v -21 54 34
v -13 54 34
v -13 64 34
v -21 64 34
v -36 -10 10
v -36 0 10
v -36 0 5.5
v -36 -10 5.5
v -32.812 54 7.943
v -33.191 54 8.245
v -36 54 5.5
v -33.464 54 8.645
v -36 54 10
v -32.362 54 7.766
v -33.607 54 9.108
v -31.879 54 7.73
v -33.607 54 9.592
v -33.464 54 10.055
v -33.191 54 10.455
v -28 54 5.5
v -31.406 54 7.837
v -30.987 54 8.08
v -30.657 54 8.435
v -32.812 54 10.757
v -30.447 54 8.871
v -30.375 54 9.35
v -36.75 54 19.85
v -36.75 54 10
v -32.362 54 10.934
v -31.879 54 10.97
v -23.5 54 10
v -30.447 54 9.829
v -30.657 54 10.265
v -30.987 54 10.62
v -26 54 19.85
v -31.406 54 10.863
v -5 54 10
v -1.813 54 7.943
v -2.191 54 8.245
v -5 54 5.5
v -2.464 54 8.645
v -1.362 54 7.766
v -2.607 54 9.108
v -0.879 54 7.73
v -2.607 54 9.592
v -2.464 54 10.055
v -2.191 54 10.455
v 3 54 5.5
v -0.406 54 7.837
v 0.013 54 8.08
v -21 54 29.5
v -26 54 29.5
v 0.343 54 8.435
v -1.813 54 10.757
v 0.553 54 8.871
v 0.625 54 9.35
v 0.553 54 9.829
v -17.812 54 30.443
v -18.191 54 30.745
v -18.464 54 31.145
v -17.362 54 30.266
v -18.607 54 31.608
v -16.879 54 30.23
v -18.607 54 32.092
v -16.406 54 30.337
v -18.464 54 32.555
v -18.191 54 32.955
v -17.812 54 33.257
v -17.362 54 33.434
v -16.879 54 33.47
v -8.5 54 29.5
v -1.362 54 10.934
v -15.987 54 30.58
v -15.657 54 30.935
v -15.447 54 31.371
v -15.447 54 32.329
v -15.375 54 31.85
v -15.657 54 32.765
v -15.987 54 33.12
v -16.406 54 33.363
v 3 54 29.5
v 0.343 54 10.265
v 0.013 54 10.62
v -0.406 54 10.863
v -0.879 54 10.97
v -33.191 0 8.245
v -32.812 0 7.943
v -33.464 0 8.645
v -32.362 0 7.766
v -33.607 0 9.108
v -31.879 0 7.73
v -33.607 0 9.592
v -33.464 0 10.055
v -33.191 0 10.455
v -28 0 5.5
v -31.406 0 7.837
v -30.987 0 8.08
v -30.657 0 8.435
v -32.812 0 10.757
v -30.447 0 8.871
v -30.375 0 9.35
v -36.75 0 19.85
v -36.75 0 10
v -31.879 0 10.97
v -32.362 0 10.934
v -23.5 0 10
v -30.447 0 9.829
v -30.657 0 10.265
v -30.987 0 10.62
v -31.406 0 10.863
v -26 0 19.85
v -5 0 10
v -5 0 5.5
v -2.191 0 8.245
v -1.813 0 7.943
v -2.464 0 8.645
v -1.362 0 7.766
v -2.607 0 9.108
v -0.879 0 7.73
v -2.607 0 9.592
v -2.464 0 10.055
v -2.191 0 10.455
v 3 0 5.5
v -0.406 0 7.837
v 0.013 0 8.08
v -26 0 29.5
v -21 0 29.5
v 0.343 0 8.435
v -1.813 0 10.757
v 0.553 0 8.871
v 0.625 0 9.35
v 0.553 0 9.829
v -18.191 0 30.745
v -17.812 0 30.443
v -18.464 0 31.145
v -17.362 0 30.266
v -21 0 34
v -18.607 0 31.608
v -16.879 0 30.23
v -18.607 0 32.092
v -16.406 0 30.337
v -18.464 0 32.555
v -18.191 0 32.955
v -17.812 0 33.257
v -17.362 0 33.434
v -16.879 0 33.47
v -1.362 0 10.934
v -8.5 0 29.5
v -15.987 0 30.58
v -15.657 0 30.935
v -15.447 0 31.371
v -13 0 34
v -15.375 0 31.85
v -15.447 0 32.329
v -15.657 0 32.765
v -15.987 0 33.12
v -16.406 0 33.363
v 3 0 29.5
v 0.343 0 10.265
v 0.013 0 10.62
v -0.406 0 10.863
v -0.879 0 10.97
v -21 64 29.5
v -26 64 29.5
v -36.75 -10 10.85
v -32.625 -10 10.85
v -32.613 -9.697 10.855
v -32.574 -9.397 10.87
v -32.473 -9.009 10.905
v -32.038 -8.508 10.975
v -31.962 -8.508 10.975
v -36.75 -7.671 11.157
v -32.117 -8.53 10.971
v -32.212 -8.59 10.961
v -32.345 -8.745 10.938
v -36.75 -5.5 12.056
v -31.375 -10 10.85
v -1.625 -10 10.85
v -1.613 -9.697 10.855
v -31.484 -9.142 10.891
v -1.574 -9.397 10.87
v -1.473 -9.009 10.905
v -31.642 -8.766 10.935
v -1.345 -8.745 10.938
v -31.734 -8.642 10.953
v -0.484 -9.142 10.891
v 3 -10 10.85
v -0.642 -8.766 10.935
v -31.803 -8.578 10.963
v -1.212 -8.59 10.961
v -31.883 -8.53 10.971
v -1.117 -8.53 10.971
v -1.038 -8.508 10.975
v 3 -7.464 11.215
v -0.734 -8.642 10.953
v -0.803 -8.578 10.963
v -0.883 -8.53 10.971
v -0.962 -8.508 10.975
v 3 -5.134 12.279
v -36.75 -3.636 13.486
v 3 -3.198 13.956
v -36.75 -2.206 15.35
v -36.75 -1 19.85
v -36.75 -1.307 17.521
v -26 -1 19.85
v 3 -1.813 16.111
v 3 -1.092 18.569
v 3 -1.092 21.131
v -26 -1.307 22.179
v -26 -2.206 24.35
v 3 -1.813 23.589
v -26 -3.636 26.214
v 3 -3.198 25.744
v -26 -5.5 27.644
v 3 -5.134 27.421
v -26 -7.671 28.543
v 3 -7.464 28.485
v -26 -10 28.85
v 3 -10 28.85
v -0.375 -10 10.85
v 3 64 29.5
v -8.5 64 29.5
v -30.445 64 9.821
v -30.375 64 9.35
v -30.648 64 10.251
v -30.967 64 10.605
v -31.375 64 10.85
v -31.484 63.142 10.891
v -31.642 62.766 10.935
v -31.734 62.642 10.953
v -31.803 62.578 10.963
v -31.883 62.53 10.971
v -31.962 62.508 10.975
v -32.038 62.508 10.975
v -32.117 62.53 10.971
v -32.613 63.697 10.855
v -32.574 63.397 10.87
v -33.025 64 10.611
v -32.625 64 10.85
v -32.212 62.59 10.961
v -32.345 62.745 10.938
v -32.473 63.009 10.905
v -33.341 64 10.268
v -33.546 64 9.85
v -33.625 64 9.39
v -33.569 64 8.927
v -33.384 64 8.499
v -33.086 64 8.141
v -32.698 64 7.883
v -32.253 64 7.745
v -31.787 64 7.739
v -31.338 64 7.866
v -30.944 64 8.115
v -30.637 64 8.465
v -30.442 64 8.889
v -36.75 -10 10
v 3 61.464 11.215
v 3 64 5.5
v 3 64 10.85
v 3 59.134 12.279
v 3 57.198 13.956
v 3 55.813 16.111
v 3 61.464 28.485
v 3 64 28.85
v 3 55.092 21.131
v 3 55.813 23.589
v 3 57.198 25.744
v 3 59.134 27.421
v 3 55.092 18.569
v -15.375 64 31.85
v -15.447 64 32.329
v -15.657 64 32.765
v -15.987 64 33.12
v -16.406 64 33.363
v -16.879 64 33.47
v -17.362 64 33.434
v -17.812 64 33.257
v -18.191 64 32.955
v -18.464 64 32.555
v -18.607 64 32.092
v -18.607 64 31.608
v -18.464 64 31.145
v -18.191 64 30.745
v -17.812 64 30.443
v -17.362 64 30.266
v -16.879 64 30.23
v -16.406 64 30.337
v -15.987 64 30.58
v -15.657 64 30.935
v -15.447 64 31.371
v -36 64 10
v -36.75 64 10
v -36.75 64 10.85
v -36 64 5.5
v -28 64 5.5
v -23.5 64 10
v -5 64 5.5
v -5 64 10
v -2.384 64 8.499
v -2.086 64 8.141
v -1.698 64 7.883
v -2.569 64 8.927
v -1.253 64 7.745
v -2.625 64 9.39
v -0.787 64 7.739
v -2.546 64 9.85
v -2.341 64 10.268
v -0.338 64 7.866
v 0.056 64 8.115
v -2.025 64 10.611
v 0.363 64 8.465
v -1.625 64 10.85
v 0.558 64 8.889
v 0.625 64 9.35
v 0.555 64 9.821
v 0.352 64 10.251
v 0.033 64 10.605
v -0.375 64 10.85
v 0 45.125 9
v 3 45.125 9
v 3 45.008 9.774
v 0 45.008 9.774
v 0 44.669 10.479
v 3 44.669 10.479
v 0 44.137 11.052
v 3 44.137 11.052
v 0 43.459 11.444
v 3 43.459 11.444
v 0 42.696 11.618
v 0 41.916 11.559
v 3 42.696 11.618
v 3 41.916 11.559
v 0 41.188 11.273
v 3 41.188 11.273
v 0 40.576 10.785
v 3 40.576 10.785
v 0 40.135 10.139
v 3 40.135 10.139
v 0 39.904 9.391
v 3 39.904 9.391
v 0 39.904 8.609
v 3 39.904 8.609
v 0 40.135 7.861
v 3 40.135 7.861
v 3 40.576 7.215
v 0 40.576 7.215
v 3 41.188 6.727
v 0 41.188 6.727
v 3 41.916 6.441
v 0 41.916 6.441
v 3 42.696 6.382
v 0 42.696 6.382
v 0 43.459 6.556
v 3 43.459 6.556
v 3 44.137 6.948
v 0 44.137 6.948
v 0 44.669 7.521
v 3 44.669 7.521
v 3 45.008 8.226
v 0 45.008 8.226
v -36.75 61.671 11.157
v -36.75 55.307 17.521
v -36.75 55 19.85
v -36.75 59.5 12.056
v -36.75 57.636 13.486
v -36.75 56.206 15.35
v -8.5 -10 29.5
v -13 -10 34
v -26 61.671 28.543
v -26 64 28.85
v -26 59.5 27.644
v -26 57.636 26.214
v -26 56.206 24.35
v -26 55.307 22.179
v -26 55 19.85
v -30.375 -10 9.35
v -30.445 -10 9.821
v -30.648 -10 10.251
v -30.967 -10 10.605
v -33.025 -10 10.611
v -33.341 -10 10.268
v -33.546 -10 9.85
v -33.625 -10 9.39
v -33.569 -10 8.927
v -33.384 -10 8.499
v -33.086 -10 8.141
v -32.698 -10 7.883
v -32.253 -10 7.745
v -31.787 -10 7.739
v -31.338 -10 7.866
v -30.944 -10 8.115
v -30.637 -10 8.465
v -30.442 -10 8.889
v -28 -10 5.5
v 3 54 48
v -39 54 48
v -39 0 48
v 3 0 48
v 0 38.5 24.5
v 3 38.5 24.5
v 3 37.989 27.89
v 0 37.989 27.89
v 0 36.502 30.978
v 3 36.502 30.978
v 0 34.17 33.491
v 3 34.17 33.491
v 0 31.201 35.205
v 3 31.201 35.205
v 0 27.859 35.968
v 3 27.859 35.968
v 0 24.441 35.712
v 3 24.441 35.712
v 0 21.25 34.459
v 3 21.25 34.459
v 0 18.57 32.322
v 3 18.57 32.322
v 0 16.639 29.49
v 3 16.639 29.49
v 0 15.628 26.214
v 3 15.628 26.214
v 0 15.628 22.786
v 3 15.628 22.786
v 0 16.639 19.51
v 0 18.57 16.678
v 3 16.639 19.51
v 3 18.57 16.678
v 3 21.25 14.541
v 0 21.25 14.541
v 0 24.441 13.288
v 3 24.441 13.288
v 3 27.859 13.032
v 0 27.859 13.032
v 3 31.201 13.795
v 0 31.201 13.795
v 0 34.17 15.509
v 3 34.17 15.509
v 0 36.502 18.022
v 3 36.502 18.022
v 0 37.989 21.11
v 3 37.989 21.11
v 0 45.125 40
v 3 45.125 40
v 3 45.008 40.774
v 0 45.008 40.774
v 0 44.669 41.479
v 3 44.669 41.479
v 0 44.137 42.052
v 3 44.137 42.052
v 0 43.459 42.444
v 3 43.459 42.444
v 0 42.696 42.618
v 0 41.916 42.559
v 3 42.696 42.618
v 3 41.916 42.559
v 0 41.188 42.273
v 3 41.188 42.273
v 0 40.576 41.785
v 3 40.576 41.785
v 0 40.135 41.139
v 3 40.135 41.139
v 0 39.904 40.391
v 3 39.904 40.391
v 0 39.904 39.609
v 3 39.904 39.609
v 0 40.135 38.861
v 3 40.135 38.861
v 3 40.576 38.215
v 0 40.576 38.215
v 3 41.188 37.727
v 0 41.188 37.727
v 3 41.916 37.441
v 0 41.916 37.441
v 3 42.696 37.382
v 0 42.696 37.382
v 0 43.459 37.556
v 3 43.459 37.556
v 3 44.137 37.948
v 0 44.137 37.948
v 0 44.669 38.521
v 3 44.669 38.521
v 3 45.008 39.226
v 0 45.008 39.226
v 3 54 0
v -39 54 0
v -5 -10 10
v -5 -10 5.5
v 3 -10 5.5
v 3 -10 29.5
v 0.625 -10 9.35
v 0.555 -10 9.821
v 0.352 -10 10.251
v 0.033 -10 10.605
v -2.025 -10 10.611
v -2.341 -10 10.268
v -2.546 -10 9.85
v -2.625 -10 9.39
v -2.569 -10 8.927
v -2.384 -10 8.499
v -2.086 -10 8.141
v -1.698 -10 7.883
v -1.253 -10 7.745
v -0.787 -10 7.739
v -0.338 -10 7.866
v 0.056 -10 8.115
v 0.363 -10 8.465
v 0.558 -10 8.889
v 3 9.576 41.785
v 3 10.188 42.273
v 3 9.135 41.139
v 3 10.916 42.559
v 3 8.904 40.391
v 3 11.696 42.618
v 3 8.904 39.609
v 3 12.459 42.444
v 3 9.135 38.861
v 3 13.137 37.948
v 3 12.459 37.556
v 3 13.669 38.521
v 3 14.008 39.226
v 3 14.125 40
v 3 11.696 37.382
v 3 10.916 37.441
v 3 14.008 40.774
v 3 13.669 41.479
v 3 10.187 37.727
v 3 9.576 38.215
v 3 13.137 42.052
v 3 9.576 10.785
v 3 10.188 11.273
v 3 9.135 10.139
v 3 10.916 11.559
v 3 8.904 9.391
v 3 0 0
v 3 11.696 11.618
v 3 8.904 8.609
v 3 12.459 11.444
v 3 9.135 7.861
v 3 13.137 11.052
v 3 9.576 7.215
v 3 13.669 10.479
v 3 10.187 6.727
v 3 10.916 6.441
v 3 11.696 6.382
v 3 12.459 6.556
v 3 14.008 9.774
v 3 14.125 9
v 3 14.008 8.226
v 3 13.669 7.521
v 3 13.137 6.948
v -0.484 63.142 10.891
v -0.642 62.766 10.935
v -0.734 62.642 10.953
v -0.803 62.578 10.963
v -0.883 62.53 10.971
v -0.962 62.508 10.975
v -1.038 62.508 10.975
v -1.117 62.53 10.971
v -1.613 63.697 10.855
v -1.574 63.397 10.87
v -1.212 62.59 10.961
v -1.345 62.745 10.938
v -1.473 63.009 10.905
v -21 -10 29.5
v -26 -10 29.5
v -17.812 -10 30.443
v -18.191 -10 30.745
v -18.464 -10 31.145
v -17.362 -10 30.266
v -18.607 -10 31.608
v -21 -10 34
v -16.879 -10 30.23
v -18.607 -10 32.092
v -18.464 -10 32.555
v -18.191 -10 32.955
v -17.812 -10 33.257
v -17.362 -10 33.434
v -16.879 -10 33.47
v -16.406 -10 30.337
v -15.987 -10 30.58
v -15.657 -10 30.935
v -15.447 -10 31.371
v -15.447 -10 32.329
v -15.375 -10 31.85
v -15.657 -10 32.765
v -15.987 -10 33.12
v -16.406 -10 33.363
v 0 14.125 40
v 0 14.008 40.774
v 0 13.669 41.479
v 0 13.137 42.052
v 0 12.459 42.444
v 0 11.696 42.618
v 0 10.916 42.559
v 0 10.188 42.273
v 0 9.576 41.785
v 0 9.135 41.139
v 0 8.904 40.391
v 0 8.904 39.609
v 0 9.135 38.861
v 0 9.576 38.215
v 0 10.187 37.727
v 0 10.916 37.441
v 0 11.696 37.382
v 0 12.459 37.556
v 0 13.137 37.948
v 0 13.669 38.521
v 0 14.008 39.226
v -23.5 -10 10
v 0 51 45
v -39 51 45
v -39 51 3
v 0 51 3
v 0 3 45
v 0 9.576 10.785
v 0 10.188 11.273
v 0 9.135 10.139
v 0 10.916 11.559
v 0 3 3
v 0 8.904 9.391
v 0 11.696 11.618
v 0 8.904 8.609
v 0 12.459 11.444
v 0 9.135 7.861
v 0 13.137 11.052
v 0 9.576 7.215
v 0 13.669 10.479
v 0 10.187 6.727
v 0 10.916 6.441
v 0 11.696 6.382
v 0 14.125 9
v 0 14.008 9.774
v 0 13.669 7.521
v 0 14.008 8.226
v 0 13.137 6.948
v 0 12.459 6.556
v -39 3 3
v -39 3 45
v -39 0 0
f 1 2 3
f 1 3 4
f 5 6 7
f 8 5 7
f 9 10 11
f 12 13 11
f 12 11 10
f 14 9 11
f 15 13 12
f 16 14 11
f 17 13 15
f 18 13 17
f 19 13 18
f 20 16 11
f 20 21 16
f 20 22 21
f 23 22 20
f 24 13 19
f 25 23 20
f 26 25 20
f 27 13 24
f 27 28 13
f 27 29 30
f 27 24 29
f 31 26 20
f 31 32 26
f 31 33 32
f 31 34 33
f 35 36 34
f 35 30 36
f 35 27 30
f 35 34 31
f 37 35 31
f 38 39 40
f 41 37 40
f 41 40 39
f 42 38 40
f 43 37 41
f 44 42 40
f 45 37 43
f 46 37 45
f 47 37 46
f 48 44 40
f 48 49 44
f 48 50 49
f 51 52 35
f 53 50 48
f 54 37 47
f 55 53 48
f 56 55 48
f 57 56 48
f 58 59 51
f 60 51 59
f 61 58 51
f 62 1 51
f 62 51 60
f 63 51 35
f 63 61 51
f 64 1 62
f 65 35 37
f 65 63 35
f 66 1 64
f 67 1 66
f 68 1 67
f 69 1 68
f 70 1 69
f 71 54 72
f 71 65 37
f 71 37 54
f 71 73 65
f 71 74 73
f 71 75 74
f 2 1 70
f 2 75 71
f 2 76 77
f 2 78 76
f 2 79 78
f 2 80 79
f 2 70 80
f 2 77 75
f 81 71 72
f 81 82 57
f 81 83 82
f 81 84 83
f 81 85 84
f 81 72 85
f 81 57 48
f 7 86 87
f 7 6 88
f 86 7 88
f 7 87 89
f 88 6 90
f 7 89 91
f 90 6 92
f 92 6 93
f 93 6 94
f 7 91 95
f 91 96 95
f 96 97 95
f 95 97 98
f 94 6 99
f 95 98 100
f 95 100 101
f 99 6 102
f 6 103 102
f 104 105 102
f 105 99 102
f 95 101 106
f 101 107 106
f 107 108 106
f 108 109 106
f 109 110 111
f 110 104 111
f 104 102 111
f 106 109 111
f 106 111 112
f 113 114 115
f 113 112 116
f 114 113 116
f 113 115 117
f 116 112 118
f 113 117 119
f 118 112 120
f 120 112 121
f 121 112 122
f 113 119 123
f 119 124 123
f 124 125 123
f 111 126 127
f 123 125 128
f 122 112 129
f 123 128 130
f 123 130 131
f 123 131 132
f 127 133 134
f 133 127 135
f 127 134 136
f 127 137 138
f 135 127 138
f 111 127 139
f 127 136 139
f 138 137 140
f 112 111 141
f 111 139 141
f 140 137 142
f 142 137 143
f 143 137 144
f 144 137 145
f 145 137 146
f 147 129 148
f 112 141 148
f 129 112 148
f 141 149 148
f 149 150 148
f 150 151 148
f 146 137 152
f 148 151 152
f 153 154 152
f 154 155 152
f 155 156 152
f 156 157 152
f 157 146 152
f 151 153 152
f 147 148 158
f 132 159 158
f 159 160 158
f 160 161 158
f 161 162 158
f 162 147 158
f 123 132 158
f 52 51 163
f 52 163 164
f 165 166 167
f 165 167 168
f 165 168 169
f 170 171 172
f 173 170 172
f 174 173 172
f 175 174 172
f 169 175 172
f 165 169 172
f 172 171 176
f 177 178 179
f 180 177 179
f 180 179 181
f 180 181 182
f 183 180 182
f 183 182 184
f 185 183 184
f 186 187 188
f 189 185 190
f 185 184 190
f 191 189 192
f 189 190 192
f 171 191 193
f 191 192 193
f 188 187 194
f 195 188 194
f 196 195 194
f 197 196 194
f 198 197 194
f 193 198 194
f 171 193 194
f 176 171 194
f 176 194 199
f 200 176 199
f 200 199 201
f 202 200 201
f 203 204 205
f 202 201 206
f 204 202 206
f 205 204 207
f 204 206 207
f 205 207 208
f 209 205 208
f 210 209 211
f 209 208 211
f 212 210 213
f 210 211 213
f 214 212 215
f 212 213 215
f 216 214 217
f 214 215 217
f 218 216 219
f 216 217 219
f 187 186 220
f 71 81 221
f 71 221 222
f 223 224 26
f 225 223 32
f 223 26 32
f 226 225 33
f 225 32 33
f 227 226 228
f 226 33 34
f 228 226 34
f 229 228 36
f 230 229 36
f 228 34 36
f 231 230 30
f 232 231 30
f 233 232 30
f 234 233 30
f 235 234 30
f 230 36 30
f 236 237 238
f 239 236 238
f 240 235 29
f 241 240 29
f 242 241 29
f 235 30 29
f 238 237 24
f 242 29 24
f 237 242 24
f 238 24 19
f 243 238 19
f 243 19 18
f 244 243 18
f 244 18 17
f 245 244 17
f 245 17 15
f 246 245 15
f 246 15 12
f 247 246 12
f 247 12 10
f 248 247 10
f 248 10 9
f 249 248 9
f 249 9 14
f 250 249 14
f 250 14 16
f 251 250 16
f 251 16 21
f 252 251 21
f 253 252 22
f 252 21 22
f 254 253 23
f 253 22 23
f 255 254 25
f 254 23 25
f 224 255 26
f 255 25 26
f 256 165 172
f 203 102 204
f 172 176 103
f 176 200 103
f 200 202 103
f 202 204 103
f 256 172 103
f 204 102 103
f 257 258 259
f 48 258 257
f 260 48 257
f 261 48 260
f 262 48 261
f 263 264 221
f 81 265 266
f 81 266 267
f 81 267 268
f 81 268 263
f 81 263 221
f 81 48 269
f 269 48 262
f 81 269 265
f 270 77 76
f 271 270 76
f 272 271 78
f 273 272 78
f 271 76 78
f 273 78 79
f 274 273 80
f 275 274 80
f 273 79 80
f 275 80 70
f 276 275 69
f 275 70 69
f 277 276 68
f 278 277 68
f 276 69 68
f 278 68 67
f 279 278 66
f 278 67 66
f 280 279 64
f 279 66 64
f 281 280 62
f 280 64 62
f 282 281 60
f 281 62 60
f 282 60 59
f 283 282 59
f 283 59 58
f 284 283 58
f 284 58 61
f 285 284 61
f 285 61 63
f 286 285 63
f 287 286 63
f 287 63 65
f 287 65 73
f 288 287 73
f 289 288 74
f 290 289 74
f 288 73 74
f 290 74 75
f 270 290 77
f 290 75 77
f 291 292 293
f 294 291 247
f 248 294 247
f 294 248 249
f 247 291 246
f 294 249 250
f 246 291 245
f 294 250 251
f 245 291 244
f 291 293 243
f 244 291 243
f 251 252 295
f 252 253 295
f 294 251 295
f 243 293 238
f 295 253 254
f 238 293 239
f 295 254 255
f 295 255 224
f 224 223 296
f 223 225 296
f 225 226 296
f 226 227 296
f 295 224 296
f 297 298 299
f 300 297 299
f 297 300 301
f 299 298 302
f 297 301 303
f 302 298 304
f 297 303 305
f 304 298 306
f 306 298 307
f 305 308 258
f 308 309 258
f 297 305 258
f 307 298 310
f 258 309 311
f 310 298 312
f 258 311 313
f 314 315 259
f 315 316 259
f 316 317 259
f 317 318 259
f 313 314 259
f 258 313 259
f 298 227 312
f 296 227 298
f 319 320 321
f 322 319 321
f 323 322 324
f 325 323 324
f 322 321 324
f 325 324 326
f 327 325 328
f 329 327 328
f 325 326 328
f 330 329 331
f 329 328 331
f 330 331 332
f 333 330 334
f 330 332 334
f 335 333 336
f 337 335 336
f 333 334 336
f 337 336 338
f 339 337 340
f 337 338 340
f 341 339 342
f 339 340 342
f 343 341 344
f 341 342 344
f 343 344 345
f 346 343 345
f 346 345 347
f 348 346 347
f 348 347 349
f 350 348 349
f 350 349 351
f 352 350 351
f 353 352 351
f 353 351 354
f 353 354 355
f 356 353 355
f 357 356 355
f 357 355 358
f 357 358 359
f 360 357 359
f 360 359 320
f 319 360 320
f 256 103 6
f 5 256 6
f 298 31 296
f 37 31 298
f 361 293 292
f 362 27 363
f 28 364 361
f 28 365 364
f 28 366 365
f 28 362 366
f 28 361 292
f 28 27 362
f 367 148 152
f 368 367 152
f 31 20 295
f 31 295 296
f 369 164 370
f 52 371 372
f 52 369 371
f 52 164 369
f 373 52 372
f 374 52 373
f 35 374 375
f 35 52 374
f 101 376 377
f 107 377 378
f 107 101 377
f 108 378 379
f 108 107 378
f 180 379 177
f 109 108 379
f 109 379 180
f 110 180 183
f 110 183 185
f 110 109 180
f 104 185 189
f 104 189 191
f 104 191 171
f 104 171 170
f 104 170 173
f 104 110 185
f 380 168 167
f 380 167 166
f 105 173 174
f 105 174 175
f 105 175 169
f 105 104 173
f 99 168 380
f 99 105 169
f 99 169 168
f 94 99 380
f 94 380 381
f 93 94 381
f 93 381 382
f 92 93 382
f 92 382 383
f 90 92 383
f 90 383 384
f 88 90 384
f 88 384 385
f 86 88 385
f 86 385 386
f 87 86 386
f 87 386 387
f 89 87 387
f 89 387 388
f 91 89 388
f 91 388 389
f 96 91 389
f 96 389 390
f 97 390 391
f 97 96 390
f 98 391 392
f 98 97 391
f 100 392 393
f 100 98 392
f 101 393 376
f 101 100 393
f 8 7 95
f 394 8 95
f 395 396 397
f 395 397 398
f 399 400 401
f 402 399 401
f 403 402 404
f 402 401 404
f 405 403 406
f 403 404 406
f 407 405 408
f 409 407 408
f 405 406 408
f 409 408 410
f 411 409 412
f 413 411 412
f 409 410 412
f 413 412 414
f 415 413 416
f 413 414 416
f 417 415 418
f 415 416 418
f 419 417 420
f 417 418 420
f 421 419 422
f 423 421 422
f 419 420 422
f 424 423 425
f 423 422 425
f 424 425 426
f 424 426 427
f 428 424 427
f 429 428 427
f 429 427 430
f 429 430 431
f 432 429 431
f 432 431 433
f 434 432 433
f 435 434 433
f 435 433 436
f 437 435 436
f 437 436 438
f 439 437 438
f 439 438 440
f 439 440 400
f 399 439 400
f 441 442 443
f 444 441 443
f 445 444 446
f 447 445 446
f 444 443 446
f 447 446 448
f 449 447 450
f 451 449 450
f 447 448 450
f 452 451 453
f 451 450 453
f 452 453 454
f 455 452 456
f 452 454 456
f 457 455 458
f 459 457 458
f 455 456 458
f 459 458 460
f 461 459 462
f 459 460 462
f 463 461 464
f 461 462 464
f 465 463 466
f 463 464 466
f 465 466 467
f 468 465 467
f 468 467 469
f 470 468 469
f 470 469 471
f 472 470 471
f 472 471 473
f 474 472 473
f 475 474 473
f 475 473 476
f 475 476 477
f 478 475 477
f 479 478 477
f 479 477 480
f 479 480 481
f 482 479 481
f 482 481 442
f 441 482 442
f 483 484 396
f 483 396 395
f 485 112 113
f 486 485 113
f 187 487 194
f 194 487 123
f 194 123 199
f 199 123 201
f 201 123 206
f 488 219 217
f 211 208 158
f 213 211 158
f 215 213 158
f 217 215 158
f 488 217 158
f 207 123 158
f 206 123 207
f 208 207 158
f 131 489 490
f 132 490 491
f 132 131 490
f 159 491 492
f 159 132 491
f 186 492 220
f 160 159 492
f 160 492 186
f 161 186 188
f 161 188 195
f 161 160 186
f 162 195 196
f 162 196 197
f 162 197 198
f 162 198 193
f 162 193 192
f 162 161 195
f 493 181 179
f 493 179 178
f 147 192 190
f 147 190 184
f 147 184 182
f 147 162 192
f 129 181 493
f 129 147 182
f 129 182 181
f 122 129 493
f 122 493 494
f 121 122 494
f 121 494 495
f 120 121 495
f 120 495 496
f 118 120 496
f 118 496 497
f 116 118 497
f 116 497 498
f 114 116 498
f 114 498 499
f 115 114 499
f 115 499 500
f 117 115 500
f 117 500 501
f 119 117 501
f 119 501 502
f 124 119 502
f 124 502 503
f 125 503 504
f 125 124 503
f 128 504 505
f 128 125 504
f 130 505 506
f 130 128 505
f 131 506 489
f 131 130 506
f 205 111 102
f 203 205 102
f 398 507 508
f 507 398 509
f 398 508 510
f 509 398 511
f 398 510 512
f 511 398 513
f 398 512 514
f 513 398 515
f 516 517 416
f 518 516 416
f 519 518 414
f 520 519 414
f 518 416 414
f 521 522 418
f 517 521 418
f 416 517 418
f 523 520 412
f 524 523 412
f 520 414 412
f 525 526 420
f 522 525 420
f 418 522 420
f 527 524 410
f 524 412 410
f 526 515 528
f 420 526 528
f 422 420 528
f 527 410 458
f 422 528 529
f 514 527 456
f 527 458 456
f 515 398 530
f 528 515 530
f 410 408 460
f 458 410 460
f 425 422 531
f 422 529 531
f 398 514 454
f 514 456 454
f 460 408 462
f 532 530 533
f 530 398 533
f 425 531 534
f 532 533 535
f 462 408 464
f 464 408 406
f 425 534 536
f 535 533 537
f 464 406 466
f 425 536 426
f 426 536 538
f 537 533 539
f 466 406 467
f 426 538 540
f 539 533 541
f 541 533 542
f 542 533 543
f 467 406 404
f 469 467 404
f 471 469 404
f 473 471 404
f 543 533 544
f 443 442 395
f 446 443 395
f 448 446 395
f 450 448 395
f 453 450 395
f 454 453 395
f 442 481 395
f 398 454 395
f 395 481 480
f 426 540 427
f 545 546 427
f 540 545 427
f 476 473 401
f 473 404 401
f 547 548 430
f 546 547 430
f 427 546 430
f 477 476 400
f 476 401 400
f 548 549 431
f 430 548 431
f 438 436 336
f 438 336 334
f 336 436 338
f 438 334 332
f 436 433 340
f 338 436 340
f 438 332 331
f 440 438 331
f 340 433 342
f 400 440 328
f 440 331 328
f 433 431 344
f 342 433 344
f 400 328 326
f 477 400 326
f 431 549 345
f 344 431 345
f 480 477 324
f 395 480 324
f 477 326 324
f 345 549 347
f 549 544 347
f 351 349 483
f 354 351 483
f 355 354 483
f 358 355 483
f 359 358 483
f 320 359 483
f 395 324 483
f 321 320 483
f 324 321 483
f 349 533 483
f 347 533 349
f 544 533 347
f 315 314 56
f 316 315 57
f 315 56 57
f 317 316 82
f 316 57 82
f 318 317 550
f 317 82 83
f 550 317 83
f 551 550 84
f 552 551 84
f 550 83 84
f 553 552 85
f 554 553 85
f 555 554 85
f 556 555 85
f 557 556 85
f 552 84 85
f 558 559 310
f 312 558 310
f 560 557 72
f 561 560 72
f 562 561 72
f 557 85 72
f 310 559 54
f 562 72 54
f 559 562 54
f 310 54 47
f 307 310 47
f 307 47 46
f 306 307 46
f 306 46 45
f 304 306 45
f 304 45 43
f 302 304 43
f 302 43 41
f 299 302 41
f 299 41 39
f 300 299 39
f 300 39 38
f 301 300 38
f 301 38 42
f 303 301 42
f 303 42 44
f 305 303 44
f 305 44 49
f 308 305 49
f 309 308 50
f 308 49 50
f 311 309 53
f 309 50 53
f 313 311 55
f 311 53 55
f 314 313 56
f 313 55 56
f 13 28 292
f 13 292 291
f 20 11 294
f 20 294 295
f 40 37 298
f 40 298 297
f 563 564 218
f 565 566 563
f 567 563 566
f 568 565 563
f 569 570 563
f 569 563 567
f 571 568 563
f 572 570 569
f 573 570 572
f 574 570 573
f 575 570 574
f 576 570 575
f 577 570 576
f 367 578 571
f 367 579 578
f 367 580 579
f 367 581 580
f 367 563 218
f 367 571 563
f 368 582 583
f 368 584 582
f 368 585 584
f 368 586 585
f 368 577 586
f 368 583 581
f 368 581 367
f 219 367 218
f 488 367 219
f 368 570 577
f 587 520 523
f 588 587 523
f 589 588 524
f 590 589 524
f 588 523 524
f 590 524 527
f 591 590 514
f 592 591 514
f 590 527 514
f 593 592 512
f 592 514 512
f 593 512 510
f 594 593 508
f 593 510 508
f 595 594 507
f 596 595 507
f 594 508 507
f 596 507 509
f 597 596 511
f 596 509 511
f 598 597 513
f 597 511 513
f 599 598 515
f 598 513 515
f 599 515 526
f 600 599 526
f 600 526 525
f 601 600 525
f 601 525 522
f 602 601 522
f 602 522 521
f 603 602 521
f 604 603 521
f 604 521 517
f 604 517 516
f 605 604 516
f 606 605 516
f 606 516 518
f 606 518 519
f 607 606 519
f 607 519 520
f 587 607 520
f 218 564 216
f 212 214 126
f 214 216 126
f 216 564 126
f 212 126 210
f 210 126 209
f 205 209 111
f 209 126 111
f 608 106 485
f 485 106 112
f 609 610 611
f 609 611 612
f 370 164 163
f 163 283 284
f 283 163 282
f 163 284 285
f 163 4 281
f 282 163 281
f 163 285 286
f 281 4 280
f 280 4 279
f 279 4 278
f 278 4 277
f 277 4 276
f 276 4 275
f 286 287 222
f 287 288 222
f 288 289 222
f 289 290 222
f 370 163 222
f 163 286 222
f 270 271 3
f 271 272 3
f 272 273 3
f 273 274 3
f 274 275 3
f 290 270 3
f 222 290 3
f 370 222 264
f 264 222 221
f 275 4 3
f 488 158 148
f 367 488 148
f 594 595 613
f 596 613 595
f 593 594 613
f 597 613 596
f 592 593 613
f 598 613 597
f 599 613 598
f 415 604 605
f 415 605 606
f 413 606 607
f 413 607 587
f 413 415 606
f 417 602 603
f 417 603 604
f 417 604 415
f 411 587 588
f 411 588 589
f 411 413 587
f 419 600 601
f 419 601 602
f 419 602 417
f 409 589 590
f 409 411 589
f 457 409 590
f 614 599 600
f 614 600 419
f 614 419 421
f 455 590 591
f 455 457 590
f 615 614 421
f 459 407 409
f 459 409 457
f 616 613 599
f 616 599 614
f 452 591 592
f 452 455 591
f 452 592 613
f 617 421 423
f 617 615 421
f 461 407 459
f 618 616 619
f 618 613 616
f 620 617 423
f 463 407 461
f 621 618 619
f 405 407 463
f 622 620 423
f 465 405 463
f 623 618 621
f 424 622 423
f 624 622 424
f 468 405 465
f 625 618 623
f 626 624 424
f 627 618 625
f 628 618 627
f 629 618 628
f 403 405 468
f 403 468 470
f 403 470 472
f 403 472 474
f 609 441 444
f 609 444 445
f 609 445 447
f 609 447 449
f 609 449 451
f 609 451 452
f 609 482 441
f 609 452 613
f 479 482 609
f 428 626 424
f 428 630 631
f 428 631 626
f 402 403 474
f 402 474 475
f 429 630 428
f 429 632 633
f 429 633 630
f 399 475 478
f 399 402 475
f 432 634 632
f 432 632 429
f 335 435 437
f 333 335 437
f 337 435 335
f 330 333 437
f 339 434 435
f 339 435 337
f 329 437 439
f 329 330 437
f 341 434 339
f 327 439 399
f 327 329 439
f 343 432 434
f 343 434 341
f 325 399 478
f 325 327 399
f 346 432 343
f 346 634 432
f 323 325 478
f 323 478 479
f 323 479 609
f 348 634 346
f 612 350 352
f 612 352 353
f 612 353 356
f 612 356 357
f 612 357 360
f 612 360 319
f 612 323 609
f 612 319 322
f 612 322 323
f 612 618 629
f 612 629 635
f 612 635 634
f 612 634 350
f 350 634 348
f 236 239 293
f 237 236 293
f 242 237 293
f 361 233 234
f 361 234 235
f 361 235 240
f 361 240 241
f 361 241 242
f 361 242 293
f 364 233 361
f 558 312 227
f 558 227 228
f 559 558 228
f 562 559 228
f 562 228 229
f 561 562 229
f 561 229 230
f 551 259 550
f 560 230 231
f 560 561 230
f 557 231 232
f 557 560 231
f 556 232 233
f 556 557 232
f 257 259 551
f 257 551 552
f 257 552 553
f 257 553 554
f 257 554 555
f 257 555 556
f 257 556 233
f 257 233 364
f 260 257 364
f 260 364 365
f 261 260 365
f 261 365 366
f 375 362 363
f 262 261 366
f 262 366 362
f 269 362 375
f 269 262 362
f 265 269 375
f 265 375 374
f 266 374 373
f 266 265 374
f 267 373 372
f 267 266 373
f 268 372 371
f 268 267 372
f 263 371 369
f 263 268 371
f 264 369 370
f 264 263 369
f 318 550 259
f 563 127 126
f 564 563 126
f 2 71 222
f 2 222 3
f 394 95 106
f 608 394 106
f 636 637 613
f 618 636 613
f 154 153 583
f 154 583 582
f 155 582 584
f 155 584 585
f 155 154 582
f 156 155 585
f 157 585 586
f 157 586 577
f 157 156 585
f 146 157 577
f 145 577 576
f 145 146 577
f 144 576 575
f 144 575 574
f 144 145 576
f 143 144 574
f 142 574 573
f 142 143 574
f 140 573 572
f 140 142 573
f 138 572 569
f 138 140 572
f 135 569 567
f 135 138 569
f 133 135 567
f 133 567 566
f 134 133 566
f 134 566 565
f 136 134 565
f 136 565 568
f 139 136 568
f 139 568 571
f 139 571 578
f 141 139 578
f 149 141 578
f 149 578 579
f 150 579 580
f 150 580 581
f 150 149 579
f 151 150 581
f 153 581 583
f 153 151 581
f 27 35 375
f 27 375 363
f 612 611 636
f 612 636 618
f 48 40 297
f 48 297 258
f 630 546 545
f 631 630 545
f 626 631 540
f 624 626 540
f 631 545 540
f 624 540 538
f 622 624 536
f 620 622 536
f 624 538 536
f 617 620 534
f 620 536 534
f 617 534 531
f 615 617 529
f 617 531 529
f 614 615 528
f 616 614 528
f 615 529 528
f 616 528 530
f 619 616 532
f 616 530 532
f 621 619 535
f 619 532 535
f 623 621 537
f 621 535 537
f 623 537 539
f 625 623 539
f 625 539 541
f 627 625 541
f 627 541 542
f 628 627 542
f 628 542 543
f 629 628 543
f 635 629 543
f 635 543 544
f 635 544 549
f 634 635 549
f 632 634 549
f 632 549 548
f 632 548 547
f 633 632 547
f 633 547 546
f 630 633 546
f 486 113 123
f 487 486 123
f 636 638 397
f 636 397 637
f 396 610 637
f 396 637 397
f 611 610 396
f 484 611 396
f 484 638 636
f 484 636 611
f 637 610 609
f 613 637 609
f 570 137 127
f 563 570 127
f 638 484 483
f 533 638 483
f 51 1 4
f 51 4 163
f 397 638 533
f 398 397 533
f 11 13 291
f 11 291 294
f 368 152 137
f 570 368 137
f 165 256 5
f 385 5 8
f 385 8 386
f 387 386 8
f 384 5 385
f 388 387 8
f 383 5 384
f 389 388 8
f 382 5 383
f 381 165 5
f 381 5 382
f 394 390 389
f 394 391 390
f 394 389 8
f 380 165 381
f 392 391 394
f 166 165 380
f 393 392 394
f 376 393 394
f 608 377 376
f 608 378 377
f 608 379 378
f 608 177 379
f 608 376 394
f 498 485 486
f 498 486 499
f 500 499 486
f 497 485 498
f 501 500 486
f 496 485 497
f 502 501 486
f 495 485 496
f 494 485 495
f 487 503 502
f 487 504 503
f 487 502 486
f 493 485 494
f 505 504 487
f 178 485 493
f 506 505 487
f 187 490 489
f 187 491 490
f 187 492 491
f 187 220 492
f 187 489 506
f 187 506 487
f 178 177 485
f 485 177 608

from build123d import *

# Parameters (mm, degrees)
F0_R      = 1.625
F1_DEPTH  = 10
F3_DEPTH  = 39.751
F4_W      = 42
F4_H      = 54
F5_DEPTH  = 48
F6_T      = -3
F9_R      = 2.625
F9_R_2    = 11.5
F10_DEPTH = 42.001


with BuildPart() as f1:
    # F0 (on Front) → F1 (new body)
    with BuildSketch(Plane.XZ):
        Polygon((-5, 5.5), (3, 5.5), (3, 10), (3, 19.85), (3, 29.5), (-8.5, 29.5), (-13, 34), (-21, 34), (-21, 29.5), (-26, 29.5), (-26, 19.85), (-36.75, 19.85), (-36.75, 10), (-36, 10), (-36, 5.5), (-28, 5.5), (-23.5, 10), (-5, 10), align=None)
        with Locations((-32, 9.3499994636)):
            Circle(F0_R, mode=Mode.SUBTRACT)
        with Locations((-1, 9.3499994636)):
            Circle(F0_R, mode=Mode.SUBTRACT)
        with Locations((-17, 31.8499994636)):
            Circle(F0_R, mode=Mode.SUBTRACT)
    extrude(amount=F1_DEPTH)

    # F2 (on face) → F3 (cut, through all)
    with BuildSketch(Plane.YZ.offset(3)):
        with BuildLine():
            Line((-10.3440208091, 28.8434225789), (-10.3440208091, 10.8565774211))
            ThreePointArc((-10.3440208091, 10.8565774211), (-10.1720418405, 10.8516445055), (-10, 10.85))
            Line((-10, 10.85), (-10, 28.85))
            ThreePointArc((-10, 28.85), (-10.1720418405, 28.8483554945), (-10.3440208091, 28.8434225789))
        make_face()
        with BuildLine():
            Line((-10, 28.85), (-10, 10.85))
            ThreePointArc((-10, 10.85), (-1, 19.85), (-10, 28.85))
        make_face()
    extrude(amount=-F3_DEPTH, mode=Mode.SUBTRACT)


with BuildPart() as f5:
    # F4 (on Top) → F5 (new body)
    with BuildSketch(Plane.XY):
        with Locations((-18, 27)):
            Rectangle(F4_W, F4_H)
    extrude(amount=F5_DEPTH)

    # F6
    f6_openings = [f5.faces().sort_by_distance(p)[0] for p in [
        (-39, 27, 24),
    ]]
    offset(amount=F6_T, openings=f6_openings)

    # F9 (on face) → F10 (cut, through all)
    with BuildSketch(Plane.YZ.offset(3)):
        with Locations((11.5, 40)):
            Circle(F9_R)
        with Locations((27, 24.5)):
            Circle(F9_R_2)
        with Locations((11.5, 9)):
            Circle(F9_R)
        with Locations((42.5, 9)):
            Circle(F9_R)
        with Locations((42.5, 40)):
            Circle(F9_R)
    extrude(amount=-F10_DEPTH, mode=Mode.SUBTRACT)


with BuildPart() as f8_1:
    # F8: instance of F1
    add(f1.part.mirror(Plane.XZ.offset(-27)))


solid = Compound([f1.part, f5.part, f8_1.part])
